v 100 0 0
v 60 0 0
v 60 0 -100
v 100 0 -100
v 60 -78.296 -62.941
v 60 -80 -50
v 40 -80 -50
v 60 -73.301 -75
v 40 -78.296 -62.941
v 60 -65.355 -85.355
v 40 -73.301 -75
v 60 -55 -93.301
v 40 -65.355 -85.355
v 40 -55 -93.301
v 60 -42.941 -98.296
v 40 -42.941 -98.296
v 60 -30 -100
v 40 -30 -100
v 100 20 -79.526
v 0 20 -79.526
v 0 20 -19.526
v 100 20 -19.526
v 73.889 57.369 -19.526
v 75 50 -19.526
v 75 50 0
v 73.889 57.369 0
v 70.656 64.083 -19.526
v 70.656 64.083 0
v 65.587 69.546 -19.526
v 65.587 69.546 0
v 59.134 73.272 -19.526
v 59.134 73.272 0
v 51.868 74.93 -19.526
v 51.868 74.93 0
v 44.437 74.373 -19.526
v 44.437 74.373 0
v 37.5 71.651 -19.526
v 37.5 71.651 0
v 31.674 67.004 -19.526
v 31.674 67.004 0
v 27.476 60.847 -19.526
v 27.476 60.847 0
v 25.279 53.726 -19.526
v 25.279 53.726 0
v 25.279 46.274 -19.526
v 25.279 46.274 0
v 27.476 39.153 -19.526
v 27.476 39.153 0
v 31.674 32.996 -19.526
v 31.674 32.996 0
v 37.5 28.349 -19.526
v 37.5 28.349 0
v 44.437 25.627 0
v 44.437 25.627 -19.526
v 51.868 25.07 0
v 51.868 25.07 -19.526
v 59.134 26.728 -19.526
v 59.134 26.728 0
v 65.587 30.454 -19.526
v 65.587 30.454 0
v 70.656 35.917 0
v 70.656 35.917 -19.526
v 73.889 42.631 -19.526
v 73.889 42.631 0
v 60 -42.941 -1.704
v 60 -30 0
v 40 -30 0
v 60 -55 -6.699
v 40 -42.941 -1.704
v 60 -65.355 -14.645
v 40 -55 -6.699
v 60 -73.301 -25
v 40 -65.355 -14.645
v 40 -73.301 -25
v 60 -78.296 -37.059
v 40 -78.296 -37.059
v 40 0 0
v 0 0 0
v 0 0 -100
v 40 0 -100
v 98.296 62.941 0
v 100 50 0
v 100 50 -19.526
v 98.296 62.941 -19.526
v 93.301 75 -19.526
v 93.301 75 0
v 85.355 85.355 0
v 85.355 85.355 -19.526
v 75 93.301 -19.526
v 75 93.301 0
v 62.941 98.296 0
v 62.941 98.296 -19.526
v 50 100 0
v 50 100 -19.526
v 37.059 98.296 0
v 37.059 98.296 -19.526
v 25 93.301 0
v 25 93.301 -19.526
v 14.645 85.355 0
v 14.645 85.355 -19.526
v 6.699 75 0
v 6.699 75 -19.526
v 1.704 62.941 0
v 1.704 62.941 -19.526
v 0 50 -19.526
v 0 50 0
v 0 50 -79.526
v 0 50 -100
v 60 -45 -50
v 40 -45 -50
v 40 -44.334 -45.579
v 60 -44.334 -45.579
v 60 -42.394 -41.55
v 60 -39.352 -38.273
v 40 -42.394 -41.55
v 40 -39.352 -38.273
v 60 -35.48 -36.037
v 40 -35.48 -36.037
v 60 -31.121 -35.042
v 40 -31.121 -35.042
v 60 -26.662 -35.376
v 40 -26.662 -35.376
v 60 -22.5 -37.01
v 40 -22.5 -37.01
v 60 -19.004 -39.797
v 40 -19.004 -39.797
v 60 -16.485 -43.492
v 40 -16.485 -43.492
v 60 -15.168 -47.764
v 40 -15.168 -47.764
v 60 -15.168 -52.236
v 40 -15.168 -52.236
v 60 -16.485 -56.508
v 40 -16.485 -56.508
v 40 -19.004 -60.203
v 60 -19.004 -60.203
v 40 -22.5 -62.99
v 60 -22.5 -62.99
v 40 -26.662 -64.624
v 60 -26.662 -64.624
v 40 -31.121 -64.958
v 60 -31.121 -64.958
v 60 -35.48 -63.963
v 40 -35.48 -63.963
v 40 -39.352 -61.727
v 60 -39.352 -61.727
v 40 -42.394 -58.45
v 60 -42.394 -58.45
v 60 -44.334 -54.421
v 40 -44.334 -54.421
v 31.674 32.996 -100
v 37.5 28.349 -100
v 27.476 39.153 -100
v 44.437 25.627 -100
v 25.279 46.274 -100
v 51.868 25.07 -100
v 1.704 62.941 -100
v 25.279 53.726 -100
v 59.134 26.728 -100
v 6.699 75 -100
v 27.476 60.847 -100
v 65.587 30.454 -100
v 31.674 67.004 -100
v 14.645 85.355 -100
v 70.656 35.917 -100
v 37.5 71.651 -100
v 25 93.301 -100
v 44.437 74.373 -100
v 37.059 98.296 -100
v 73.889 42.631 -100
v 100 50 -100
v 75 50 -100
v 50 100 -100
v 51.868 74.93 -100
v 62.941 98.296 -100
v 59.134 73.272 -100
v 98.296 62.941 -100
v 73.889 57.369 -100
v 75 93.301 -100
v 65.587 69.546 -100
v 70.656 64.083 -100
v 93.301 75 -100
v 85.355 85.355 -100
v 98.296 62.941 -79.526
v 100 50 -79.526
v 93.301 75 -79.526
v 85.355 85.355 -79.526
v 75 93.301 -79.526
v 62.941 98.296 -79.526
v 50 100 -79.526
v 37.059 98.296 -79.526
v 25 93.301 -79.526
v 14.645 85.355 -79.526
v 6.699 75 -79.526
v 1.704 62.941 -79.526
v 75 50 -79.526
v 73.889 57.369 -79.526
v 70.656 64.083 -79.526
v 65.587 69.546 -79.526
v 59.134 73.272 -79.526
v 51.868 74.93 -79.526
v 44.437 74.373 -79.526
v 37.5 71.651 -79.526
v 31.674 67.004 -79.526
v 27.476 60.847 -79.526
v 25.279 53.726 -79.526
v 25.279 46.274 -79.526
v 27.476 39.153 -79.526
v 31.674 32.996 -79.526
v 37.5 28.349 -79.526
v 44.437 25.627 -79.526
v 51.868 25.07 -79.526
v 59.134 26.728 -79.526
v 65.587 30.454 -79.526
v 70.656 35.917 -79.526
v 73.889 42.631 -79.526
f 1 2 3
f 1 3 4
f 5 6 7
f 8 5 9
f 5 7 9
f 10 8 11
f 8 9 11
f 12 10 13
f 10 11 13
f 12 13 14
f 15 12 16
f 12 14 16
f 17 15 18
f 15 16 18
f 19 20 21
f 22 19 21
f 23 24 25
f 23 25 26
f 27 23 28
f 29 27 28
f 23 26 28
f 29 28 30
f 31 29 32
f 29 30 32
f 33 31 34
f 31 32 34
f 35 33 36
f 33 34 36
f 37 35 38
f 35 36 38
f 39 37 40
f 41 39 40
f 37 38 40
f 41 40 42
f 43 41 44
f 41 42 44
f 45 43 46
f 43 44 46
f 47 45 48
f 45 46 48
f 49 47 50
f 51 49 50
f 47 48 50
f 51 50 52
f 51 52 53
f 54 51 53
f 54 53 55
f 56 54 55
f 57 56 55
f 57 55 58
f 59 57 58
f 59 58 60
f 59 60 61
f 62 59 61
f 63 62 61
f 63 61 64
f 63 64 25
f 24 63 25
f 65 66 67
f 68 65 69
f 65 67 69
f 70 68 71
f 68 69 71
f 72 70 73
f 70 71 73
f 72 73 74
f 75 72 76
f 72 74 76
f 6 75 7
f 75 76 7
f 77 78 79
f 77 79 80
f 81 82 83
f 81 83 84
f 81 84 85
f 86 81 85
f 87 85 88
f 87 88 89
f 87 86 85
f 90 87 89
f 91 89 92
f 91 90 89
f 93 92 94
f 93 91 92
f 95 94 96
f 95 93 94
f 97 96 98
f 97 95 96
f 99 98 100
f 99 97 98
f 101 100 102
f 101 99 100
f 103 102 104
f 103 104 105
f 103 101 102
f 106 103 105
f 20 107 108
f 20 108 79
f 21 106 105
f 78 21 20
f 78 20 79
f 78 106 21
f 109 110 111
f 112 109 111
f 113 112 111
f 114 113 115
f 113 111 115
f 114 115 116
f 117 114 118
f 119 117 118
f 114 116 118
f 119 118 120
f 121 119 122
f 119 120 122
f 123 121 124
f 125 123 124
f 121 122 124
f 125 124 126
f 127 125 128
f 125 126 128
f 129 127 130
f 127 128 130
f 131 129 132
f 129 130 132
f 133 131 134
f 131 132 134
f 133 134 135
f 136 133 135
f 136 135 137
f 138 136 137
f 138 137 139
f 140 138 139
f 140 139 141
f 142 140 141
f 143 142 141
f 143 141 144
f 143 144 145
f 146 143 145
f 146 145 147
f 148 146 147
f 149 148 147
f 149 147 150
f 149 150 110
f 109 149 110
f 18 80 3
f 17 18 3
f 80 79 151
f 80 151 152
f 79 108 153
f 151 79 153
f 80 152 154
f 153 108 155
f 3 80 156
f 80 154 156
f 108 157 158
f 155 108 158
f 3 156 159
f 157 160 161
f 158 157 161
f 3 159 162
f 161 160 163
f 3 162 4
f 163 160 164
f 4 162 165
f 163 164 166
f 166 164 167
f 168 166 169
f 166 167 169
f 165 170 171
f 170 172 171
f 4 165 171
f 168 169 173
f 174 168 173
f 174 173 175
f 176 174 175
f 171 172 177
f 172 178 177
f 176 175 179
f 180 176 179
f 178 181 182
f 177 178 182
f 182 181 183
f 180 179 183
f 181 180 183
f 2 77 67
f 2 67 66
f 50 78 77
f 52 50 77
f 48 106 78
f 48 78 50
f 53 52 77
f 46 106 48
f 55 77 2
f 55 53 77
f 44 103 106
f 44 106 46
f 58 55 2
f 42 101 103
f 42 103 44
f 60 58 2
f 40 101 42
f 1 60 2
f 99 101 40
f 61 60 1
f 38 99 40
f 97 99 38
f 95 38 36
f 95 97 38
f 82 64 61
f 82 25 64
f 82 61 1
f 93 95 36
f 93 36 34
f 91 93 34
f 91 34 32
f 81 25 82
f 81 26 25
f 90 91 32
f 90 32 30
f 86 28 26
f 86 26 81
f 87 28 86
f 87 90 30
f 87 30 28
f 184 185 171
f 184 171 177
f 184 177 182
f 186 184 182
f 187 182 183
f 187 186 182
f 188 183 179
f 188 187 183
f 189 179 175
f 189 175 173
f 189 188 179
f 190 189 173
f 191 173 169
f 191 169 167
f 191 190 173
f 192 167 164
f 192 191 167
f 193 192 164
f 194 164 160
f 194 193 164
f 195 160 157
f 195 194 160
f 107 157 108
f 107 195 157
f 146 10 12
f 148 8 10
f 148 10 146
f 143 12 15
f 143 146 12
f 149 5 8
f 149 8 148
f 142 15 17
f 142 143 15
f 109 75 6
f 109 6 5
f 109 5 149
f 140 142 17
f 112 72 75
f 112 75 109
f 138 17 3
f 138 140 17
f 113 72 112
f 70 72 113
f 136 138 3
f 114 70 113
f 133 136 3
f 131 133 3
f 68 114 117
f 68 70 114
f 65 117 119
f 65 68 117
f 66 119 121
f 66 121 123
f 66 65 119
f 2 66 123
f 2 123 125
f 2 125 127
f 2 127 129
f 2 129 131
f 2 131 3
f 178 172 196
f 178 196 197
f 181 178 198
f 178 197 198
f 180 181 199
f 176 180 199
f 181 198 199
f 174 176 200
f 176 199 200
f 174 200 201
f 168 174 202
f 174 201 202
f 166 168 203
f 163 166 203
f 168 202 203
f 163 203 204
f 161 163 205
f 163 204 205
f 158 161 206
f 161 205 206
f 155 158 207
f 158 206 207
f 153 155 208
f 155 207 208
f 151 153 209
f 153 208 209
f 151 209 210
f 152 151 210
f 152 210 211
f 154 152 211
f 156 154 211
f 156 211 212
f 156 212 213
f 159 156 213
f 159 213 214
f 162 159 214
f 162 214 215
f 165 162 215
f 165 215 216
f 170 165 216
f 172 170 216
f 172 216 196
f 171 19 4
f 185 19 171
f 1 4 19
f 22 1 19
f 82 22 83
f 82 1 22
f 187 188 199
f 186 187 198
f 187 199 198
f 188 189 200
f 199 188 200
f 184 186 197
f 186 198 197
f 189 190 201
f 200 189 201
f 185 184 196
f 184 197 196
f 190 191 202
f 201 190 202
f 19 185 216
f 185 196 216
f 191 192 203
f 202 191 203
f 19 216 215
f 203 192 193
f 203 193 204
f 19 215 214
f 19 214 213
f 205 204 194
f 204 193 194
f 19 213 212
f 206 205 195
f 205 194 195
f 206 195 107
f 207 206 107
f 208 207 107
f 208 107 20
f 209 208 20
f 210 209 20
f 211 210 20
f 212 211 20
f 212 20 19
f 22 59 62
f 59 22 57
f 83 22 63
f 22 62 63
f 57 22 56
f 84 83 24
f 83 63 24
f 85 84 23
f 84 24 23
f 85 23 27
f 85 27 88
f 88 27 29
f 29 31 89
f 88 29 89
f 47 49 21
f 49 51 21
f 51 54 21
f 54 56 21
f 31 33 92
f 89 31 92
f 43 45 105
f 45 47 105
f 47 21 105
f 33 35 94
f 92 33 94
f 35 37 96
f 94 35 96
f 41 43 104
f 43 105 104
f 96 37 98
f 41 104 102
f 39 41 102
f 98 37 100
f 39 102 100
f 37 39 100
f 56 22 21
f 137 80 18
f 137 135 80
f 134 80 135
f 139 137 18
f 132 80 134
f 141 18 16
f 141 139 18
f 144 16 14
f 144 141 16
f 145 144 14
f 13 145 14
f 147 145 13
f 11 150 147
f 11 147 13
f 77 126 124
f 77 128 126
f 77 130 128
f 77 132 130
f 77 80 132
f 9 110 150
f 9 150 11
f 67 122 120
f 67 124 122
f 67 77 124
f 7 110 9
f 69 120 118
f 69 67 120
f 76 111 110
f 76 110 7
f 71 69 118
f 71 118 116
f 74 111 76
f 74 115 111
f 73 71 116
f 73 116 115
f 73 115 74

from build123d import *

# Parameters (mm, degrees)
F0_W     = 20
F0_H     = 50
F0_R     = 25
F0_H_2   = 30
F1_DEPTH = 100
F2_W     = 30
F2_H     = 60
F2_W_2   = 55.66628
F3_DEPTH = 100.001
F5_DEPTH = 60.001
F4_R     = 15
F6_DEPTH = 60.001


with BuildPart() as f1:
    # F0 (on Top) → F1 (new body)
    with BuildSketch(Plane.XY):
        with Locations((50, -55)):
            Rectangle(F0_W, F0_H)
        with BuildLine():
            Line((0, 50), (0, 0))
            Line((0, 0), (40, 0))
            Line((40, 0), (60, 0))
            Line((60, 0), (100, 0))
            Line((100, 0), (100, 50))
            ThreePointArc((100, 50), (50, 100), (0, 50))
        make_face()
        with Locations((50, 50)):
            Circle(F0_R, mode=Mode.SUBTRACT)
        with Locations((50, -15)):
            Rectangle(F0_W, F0_H_2)
    extrude(amount=-F1_DEPTH)

    # F2 (on face) → F3 (cut, through all)
    with BuildSketch(Plane(origin=(0, 0, 0), x_dir=(0, -1, 0), z_dir=(-1, 0, 0))):
        with Locations((-35, -49.526112)):
            Rectangle(F2_W, F2_H)
        with Locations((-77.83314, -49.526112)):
            Rectangle(F2_W_2, F2_H)
    extrude(amount=-F3_DEPTH, mode=Mode.SUBTRACT)

    # F4 (on face) → F5 (cut, through all)
    with BuildSketch(Plane(origin=(40, 0, 0), x_dir=(0, -1, 0), z_dir=(-1, 0, 0))):
        with BuildLine():
            Line((80, -100), (80, -50))
            ThreePointArc((80, -50), (65.355339, -85.355339), (30, -100))
            Line((30, -100), (80, -100))
        make_face()
        with BuildLine():
            Line((80, 0), (30, 0))
            ThreePointArc((30, 0), (65.355339, -14.644661), (80, -50))
            Line((80, -50), (80, 0))
        make_face()
    extrude(amount=-F5_DEPTH, mode=Mode.SUBTRACT)

    # F4 (on face) → F6 (cut, through all)
    with BuildSketch(Plane(origin=(40, 0, 0), x_dir=(0, -1, 0), z_dir=(-1, 0, 0))):
        with Locations((30, -50)):
            Circle(F4_R)
    extrude(amount=-F6_DEPTH, mode=Mode.SUBTRACT)


solid = f1.part
